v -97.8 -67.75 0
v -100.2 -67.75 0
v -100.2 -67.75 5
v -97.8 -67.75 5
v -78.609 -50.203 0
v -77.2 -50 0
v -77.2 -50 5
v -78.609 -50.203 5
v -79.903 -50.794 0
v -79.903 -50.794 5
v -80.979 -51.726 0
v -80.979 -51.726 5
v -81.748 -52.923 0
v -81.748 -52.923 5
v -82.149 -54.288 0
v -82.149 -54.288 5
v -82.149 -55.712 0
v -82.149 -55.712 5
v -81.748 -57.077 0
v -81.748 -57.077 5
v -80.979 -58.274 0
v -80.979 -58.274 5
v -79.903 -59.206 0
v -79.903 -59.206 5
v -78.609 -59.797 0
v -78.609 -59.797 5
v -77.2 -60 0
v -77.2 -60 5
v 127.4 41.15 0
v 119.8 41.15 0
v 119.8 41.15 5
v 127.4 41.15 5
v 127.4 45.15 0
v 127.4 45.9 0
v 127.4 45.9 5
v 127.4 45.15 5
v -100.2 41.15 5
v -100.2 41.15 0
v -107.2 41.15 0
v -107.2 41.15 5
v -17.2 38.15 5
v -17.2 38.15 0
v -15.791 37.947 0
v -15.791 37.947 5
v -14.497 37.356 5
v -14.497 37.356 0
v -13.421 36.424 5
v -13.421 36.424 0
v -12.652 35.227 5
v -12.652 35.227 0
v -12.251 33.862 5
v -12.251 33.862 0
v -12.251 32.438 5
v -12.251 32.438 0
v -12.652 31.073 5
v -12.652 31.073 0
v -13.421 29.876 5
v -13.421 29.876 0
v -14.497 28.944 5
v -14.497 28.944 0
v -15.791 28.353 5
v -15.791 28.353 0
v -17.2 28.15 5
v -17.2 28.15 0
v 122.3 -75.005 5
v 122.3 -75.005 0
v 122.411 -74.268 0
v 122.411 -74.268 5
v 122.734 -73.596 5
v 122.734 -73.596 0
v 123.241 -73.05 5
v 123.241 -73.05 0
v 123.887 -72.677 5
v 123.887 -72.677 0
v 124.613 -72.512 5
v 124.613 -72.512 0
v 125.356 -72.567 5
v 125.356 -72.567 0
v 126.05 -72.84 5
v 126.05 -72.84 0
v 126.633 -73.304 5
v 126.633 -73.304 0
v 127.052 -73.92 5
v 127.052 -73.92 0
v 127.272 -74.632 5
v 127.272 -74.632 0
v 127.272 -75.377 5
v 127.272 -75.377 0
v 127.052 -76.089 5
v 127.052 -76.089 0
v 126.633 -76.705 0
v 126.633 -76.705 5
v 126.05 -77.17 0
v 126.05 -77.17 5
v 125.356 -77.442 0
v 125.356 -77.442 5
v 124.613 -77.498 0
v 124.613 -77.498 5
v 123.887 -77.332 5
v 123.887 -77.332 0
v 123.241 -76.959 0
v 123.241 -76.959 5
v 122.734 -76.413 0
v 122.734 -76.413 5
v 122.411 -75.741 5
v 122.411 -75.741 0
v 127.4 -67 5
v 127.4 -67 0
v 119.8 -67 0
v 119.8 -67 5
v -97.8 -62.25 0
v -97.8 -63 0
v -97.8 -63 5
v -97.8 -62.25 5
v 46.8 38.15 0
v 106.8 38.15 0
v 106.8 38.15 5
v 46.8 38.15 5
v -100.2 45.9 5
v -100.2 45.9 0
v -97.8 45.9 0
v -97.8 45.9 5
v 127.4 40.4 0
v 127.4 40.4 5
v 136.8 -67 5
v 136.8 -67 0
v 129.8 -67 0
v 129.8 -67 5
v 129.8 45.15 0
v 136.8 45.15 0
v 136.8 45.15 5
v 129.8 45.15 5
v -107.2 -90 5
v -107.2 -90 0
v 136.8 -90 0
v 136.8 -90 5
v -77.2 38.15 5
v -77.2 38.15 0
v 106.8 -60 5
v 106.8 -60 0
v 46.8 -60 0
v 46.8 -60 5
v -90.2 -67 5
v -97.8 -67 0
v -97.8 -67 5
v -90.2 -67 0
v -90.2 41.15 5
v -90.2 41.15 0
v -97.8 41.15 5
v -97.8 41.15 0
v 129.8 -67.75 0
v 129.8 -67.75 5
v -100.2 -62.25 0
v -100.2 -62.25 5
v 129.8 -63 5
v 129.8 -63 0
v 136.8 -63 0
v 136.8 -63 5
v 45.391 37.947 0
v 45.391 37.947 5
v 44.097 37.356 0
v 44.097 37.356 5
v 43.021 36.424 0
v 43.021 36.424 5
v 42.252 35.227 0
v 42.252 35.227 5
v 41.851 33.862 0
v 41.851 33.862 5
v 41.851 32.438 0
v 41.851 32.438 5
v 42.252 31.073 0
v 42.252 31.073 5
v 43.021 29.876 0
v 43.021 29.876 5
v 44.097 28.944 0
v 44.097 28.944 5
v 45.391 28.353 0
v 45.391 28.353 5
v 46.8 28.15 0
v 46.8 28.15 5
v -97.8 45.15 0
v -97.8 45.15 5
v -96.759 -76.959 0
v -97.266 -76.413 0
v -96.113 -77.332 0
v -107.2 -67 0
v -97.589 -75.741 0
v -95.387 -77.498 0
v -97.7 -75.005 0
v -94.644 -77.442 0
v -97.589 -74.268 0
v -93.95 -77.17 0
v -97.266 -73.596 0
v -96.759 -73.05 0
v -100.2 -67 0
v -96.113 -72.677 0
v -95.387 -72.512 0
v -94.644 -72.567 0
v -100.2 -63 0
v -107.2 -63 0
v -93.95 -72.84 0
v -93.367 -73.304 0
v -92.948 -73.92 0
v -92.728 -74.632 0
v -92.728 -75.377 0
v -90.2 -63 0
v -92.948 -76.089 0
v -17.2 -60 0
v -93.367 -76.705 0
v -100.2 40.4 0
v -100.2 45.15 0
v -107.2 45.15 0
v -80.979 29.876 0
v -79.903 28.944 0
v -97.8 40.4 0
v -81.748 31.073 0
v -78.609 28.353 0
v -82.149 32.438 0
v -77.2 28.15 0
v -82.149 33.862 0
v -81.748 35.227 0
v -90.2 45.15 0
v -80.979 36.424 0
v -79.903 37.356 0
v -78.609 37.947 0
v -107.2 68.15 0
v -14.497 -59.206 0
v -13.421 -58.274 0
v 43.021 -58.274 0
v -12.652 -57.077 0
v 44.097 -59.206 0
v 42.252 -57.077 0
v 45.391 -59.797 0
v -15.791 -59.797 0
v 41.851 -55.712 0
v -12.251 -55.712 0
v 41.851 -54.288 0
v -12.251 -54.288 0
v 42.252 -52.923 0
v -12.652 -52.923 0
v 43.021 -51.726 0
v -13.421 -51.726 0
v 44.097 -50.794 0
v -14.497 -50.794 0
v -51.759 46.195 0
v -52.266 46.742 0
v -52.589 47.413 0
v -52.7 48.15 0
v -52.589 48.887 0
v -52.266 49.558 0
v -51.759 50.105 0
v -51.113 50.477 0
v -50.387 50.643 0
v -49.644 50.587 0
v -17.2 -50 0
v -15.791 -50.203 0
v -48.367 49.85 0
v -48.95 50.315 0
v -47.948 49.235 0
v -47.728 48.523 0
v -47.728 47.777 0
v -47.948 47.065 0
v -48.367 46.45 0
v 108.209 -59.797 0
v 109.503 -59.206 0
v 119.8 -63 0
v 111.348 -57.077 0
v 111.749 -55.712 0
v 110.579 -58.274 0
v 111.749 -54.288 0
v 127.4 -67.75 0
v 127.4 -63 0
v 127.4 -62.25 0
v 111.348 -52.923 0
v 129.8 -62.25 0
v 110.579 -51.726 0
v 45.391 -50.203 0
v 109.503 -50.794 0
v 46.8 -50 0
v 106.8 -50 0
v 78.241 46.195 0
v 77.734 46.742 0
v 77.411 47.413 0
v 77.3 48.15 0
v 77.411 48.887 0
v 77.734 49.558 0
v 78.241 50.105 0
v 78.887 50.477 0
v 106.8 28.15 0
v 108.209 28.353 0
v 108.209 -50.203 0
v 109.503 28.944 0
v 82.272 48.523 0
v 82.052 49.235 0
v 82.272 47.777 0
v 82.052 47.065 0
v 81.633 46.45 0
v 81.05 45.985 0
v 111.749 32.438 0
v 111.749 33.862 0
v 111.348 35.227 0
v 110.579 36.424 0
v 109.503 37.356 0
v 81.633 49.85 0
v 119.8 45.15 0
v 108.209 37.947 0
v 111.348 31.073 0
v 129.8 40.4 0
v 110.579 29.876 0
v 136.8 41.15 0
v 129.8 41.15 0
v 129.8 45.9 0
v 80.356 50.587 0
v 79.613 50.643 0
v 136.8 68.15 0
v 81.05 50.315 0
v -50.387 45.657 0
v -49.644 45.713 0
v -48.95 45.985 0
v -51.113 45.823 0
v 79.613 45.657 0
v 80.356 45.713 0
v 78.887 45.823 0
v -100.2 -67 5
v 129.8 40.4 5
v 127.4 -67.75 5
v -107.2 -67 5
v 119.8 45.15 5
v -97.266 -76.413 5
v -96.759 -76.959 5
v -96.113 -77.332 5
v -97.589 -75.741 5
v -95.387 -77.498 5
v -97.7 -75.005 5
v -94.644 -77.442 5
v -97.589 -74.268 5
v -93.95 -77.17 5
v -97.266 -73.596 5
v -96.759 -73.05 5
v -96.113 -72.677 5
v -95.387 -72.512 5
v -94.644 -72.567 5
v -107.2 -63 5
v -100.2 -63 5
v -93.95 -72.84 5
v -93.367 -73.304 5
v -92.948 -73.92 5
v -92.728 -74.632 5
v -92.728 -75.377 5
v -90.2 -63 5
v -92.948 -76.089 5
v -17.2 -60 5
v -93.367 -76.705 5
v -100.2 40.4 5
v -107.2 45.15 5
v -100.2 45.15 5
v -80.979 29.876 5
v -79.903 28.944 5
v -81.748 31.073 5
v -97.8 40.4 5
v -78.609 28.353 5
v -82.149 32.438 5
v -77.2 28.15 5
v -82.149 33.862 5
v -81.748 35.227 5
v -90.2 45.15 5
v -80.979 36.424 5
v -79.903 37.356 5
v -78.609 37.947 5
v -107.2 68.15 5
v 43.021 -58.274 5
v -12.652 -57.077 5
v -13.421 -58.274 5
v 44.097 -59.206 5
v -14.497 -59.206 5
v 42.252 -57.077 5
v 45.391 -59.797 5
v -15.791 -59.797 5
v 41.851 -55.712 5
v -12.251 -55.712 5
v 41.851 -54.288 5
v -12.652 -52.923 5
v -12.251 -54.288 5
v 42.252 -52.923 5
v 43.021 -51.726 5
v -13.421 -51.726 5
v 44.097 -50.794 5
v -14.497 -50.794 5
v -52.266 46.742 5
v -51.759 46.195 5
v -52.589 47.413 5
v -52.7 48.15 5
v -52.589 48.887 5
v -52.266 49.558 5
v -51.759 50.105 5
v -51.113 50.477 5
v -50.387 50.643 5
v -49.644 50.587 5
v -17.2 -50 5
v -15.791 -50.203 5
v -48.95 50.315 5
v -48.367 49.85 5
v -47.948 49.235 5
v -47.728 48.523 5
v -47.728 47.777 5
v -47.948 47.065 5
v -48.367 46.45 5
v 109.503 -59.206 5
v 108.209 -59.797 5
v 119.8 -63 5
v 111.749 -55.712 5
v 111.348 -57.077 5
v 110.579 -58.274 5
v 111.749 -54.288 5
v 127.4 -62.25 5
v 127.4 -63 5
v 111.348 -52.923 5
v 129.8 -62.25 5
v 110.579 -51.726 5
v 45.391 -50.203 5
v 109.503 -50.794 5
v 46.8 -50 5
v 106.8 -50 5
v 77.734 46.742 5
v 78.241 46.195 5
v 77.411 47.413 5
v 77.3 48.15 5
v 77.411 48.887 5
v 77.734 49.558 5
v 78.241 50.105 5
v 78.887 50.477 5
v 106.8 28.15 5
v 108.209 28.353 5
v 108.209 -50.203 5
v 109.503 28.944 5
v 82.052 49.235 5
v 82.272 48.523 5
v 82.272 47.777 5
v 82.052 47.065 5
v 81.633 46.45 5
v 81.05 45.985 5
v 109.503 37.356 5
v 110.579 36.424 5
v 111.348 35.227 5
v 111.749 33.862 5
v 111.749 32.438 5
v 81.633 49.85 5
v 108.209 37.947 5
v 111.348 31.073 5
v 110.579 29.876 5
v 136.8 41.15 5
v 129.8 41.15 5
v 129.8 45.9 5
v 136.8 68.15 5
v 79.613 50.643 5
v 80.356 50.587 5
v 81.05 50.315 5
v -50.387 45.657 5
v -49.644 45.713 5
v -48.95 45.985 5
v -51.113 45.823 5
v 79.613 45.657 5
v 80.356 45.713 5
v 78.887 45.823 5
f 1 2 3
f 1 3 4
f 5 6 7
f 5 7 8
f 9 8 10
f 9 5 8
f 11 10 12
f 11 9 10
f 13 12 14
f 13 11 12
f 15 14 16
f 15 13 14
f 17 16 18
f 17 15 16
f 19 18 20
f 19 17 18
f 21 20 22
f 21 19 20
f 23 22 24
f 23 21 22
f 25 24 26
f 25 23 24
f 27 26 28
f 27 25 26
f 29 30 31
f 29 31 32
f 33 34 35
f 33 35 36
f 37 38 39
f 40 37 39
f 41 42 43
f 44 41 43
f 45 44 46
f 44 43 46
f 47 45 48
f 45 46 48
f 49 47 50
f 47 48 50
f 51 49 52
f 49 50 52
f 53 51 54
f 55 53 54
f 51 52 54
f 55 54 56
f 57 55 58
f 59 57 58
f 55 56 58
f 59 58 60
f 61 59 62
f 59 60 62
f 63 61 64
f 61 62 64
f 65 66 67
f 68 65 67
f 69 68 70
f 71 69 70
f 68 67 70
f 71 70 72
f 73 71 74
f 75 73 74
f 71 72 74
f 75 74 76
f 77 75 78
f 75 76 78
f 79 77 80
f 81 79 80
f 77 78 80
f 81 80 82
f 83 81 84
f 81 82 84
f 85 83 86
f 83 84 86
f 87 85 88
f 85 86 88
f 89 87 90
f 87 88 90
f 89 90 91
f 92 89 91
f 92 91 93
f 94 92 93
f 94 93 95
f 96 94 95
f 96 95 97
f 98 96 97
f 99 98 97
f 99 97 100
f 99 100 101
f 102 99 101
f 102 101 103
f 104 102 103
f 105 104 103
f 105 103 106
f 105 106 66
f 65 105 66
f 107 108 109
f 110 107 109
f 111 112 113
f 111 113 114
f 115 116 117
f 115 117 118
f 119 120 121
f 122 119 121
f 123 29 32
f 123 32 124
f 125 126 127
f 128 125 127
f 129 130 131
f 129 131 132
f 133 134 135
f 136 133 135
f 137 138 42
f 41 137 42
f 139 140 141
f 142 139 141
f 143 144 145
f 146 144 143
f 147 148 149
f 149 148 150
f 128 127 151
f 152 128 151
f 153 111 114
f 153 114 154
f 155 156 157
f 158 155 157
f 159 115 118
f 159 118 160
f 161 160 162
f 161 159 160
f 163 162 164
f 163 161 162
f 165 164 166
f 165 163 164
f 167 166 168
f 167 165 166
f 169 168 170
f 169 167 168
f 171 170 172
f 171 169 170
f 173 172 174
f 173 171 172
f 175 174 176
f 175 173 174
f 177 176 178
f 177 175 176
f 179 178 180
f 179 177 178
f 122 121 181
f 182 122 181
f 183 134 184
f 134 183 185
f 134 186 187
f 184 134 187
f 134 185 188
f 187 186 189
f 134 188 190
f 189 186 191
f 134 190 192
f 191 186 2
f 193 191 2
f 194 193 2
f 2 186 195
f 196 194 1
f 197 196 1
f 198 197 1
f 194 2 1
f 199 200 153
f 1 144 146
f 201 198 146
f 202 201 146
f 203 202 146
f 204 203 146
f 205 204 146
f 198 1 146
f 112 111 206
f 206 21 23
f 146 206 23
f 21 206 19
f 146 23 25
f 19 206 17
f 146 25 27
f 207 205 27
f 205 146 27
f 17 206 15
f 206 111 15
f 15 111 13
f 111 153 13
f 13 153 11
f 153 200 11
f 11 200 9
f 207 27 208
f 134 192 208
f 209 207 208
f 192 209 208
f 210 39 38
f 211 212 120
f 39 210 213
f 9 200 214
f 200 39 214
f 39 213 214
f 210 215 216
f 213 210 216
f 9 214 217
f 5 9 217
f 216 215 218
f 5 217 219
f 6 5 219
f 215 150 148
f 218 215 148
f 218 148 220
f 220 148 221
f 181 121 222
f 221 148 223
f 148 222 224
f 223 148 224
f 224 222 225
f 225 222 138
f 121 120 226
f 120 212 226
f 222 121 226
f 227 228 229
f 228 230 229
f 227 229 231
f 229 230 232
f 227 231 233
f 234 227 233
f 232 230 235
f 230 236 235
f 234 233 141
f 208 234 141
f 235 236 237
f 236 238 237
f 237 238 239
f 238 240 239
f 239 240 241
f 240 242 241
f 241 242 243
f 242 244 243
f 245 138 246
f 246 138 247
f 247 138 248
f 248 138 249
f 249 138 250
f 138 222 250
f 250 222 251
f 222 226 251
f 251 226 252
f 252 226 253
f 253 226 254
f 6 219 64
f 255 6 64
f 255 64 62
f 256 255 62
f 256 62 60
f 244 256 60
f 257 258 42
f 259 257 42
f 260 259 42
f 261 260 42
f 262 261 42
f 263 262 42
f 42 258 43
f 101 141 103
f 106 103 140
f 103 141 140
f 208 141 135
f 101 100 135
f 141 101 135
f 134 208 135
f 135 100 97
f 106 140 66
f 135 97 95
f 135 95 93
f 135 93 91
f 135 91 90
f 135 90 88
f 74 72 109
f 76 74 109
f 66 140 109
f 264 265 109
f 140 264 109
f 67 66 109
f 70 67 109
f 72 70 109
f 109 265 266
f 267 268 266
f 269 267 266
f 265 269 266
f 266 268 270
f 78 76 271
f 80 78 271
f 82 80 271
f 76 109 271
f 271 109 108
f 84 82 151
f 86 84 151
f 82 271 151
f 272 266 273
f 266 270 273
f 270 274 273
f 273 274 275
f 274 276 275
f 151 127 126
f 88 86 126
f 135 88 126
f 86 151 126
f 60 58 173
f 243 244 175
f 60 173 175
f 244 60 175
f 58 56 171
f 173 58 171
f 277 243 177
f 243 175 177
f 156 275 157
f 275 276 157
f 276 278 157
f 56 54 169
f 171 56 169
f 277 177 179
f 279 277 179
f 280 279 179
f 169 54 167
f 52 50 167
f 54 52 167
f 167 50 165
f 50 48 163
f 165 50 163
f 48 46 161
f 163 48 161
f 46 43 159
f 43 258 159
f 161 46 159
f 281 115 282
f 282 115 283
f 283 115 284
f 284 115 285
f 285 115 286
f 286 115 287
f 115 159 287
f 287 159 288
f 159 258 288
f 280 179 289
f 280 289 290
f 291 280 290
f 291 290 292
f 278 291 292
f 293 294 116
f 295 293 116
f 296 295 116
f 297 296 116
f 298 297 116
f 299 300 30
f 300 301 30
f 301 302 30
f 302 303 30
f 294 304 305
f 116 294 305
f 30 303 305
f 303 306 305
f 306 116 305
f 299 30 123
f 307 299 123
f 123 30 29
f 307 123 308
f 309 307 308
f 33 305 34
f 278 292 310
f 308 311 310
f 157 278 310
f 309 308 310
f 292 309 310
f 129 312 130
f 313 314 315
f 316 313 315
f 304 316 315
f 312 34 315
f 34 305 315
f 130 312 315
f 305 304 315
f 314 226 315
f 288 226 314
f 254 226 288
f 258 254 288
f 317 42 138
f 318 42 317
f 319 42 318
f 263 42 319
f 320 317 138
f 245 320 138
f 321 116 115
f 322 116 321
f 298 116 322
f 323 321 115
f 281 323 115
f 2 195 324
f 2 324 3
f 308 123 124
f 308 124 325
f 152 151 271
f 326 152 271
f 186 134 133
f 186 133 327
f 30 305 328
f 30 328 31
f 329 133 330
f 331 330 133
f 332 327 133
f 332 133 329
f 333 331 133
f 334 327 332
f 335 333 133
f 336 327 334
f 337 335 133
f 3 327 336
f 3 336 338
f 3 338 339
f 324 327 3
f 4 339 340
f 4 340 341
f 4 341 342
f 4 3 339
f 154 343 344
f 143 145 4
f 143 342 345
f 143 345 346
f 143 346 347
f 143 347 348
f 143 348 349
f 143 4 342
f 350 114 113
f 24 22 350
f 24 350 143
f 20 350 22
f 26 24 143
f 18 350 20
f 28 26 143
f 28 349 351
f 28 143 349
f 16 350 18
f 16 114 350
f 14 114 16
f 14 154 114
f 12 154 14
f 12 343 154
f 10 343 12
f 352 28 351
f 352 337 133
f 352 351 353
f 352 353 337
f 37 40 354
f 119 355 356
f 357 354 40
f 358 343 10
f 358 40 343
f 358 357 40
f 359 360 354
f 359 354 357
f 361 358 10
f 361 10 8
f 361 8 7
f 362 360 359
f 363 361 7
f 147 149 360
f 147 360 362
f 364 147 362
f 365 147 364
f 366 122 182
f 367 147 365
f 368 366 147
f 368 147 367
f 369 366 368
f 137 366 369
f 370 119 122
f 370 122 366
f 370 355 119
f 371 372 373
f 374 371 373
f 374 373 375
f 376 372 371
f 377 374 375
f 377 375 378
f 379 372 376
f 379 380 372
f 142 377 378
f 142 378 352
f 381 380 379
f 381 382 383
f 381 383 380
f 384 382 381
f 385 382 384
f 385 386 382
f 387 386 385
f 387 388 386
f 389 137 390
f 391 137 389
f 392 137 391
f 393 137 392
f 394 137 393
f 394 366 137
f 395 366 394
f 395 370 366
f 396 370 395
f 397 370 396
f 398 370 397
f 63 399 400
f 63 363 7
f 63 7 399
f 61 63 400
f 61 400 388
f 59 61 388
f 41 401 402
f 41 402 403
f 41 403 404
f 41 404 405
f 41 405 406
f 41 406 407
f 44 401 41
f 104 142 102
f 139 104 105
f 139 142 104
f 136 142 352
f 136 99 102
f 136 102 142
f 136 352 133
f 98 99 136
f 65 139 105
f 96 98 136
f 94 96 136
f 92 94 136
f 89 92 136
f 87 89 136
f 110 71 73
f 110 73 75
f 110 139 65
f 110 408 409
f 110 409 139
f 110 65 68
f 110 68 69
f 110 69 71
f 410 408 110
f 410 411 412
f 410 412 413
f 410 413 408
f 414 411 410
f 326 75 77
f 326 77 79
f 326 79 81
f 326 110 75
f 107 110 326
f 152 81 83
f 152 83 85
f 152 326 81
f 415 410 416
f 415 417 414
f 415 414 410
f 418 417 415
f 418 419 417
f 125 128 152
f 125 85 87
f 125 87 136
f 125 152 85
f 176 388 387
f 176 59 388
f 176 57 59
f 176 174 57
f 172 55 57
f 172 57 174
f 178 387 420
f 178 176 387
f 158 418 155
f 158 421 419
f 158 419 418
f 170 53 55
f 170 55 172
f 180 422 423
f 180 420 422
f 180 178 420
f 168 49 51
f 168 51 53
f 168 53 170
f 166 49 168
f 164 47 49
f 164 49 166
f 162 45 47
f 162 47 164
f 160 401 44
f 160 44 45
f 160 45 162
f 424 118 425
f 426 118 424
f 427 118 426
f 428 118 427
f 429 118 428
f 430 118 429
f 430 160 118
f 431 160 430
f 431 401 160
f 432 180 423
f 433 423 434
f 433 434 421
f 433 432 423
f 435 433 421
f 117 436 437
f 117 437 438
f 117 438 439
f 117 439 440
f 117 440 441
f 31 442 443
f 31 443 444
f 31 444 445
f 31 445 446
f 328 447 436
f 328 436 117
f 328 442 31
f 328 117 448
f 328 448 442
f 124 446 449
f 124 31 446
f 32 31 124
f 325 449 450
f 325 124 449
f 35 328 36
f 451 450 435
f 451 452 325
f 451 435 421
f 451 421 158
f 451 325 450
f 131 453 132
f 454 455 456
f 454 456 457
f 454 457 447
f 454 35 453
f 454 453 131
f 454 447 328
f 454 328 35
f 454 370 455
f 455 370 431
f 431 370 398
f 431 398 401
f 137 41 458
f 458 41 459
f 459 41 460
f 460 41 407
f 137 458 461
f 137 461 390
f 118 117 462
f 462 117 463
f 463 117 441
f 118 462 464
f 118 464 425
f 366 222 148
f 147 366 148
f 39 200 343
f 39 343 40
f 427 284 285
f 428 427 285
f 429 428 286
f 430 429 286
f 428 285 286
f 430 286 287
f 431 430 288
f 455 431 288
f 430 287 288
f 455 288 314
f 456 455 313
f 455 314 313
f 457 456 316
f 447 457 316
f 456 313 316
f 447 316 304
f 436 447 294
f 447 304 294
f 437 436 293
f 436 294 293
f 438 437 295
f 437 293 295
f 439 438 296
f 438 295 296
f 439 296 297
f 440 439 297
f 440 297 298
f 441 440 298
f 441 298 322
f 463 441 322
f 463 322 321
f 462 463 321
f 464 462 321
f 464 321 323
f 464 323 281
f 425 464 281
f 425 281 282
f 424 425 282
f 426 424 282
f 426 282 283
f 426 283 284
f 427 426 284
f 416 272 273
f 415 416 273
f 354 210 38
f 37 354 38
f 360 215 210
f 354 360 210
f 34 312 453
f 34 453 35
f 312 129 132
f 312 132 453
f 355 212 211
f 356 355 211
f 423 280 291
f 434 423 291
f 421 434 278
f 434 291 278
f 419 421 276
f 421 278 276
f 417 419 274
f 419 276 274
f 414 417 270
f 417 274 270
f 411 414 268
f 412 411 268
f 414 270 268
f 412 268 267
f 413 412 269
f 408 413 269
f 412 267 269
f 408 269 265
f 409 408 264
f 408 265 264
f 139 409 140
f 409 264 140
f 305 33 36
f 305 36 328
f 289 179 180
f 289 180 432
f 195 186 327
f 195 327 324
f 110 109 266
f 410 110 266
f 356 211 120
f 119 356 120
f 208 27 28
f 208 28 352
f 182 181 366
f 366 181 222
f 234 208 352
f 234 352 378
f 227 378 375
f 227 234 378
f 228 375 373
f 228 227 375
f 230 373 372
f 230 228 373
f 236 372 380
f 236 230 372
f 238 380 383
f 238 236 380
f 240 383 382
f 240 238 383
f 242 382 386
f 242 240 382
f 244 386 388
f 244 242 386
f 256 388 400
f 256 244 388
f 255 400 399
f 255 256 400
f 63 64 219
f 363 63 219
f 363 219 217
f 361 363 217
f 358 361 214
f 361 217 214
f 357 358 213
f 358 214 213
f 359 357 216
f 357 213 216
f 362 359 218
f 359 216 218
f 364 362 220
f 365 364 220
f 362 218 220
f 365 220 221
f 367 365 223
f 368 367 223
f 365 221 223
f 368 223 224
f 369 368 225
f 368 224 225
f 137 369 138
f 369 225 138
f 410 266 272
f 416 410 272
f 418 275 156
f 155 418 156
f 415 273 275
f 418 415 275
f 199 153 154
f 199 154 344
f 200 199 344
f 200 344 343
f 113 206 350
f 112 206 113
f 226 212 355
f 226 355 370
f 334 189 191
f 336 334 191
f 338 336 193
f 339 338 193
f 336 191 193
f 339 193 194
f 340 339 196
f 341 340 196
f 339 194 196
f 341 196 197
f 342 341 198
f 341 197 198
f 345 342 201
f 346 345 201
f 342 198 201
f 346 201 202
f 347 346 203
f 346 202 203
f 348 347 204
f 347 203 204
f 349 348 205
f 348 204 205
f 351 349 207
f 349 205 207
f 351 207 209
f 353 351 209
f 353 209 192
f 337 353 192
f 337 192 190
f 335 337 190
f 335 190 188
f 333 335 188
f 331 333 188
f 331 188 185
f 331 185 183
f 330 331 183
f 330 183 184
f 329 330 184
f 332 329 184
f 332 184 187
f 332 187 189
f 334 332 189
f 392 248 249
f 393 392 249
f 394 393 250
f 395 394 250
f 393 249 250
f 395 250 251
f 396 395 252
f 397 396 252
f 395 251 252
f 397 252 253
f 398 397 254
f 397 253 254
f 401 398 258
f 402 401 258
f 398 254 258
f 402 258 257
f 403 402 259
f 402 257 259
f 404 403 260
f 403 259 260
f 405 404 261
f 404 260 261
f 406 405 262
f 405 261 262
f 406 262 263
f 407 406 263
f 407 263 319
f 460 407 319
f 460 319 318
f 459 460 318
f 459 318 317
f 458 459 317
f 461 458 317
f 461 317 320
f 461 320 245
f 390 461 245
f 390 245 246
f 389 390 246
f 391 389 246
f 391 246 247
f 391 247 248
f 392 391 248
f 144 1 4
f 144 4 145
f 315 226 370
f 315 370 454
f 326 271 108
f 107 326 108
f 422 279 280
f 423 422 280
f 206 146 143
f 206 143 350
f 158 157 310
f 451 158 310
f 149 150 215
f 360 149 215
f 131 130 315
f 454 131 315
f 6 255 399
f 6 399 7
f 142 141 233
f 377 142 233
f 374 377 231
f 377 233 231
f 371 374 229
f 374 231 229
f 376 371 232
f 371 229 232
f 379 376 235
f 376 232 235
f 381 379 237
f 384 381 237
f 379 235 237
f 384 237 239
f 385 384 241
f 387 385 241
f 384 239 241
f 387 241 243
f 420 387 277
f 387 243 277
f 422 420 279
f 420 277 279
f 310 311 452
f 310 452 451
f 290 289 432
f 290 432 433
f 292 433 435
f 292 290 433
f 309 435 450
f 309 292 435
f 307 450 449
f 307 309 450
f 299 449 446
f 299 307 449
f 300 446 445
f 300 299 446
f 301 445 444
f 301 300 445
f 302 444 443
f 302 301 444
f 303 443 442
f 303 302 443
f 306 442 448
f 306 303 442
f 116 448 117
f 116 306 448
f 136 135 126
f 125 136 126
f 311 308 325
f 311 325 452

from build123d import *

# Parameters (mm, degrees)
SKETCH1_W           = 244
SKETCH1_H           = 158.15
BOSS_EXTRUDE1_DEPTH = 5
CUT_EXTRUDE1_DEPTH  = 10
CUT_EXTRUDE2_DEPTH  = 10
SKETCH4_R           = 2.5
CUT_EXTRUDE3_DEPTH  = 10


with BuildPart() as part:
    # Sketch1 → Boss-Extrude1 (new body)
    with BuildSketch(Plane.XY):
        with Locations((14.8, -10.925)):
            Rectangle(SKETCH1_W, SKETCH1_H)
    extrude(amount=BOSS_EXTRUDE1_DEPTH)

    # Sketch2 → Cut-Extrude1 (cut)
    with BuildSketch(Plane(origin=(0, 0, 0), x_dir=(-1, 0, 0), z_dir=(0, 0, -1))):
        Polygon((-136.8, 45.15), (-129.8, 45.15), (-129.8, 45.9), (-127.4, 45.9), (-127.4, 45.15), (-119.8, 45.15), (-119.8, 41.15), (-127.4, 41.15), (-127.4, 40.4), (-129.8, 40.4), (-129.8, 41.15), (-136.8, 41.15), align=None)
        Polygon((-129.8, -63), (-136.8, -63), (-136.8, -67), (-129.8, -67), (-129.8, -67.75), (-127.4, -67.75), (-127.4, -67), (-119.8, -67), (-119.8, -63), (-127.4, -63), (-127.4, -62.25), (-129.8, -62.25), align=None)
        Polygon((100.2, 41.15), (107.2, 41.15), (107.2, 45.15), (100.2, 45.15), (100.2, 45.9), (97.8, 45.9), (97.8, 45.15), (90.2, 45.15), (90.2, 41.15), (97.8, 41.15), (97.8, 40.4), (100.2, 40.4), align=None)
        Polygon((107.2, -67), (100.2, -67), (100.2, -67.75), (97.8, -67.75), (97.8, -67), (90.2, -67), (90.2, -63), (97.8, -63), (97.8, -62.25), (100.2, -62.25), (100.2, -63), (107.2, -63), align=None)
    extrude(amount=-CUT_EXTRUDE1_DEPTH, mode=Mode.SUBTRACT)

    # Sketch3 → Cut-Extrude2 (cut)
    with BuildSketch(Plane(origin=(0, 0, 0), x_dir=(-1, 0, 0), z_dir=(0, 0, -1))):
        with BuildLine():
            Line((-106.8, 38.15), (-46.8, 38.15))
            ThreePointArc((-46.8, 38.15), (-41.8, 33.15), (-46.8, 28.15))
            Line((-46.8, 28.15), (-106.8, 28.15))
            ThreePointArc((-106.8, 28.15), (-111.8, 33.15), (-106.8, 38.15))
        make_face()
        with BuildLine():
            Line((-46.8, -50), (-106.8, -50))
            ThreePointArc((-106.8, -50), (-111.8, -55), (-106.8, -60))
            Line((-106.8, -60), (-46.8, -60))
            ThreePointArc((-46.8, -60), (-41.8, -55), (-46.8, -50))
        make_face()
        with BuildLine():
            Line((77.2, -60), (17.2, -60))
            ThreePointArc((17.2, -60), (12.2, -55), (17.2, -50))
            Line((17.2, -50), (77.2, -50))
            ThreePointArc((77.2, -50), (82.2, -55), (77.2, -60))
        make_face()
        with BuildLine():
            Line((17.2, 28.15), (77.2, 28.15))
            ThreePointArc((77.2, 28.15), (82.2, 33.15), (77.2, 38.15))
            Line((77.2, 38.15), (17.2, 38.15))
            ThreePointArc((17.2, 38.15), (12.2, 33.15), (17.2, 28.15))
        make_face()
    extrude(amount=-CUT_EXTRUDE2_DEPTH, mode=Mode.SUBTRACT)

    # Sketch4 → Cut-Extrude3 (cut)
    with BuildSketch(Plane(origin=(0, 0, 0), x_dir=(-1, 0, 0), z_dir=(0, 0, -1))):
        with Locations((50.2, 48.15)):
            Circle(SKETCH4_R)
        with Locations((-79.8, 48.15)):
            Circle(SKETCH4_R)
        with Locations((-124.8, -75.004567899)):
            Circle(SKETCH4_R)
        with Locations((95.2, -75.004567899)):
            Circle(SKETCH4_R)
    extrude(amount=-CUT_EXTRUDE3_DEPTH, mode=Mode.SUBTRACT)


solid = part.part
